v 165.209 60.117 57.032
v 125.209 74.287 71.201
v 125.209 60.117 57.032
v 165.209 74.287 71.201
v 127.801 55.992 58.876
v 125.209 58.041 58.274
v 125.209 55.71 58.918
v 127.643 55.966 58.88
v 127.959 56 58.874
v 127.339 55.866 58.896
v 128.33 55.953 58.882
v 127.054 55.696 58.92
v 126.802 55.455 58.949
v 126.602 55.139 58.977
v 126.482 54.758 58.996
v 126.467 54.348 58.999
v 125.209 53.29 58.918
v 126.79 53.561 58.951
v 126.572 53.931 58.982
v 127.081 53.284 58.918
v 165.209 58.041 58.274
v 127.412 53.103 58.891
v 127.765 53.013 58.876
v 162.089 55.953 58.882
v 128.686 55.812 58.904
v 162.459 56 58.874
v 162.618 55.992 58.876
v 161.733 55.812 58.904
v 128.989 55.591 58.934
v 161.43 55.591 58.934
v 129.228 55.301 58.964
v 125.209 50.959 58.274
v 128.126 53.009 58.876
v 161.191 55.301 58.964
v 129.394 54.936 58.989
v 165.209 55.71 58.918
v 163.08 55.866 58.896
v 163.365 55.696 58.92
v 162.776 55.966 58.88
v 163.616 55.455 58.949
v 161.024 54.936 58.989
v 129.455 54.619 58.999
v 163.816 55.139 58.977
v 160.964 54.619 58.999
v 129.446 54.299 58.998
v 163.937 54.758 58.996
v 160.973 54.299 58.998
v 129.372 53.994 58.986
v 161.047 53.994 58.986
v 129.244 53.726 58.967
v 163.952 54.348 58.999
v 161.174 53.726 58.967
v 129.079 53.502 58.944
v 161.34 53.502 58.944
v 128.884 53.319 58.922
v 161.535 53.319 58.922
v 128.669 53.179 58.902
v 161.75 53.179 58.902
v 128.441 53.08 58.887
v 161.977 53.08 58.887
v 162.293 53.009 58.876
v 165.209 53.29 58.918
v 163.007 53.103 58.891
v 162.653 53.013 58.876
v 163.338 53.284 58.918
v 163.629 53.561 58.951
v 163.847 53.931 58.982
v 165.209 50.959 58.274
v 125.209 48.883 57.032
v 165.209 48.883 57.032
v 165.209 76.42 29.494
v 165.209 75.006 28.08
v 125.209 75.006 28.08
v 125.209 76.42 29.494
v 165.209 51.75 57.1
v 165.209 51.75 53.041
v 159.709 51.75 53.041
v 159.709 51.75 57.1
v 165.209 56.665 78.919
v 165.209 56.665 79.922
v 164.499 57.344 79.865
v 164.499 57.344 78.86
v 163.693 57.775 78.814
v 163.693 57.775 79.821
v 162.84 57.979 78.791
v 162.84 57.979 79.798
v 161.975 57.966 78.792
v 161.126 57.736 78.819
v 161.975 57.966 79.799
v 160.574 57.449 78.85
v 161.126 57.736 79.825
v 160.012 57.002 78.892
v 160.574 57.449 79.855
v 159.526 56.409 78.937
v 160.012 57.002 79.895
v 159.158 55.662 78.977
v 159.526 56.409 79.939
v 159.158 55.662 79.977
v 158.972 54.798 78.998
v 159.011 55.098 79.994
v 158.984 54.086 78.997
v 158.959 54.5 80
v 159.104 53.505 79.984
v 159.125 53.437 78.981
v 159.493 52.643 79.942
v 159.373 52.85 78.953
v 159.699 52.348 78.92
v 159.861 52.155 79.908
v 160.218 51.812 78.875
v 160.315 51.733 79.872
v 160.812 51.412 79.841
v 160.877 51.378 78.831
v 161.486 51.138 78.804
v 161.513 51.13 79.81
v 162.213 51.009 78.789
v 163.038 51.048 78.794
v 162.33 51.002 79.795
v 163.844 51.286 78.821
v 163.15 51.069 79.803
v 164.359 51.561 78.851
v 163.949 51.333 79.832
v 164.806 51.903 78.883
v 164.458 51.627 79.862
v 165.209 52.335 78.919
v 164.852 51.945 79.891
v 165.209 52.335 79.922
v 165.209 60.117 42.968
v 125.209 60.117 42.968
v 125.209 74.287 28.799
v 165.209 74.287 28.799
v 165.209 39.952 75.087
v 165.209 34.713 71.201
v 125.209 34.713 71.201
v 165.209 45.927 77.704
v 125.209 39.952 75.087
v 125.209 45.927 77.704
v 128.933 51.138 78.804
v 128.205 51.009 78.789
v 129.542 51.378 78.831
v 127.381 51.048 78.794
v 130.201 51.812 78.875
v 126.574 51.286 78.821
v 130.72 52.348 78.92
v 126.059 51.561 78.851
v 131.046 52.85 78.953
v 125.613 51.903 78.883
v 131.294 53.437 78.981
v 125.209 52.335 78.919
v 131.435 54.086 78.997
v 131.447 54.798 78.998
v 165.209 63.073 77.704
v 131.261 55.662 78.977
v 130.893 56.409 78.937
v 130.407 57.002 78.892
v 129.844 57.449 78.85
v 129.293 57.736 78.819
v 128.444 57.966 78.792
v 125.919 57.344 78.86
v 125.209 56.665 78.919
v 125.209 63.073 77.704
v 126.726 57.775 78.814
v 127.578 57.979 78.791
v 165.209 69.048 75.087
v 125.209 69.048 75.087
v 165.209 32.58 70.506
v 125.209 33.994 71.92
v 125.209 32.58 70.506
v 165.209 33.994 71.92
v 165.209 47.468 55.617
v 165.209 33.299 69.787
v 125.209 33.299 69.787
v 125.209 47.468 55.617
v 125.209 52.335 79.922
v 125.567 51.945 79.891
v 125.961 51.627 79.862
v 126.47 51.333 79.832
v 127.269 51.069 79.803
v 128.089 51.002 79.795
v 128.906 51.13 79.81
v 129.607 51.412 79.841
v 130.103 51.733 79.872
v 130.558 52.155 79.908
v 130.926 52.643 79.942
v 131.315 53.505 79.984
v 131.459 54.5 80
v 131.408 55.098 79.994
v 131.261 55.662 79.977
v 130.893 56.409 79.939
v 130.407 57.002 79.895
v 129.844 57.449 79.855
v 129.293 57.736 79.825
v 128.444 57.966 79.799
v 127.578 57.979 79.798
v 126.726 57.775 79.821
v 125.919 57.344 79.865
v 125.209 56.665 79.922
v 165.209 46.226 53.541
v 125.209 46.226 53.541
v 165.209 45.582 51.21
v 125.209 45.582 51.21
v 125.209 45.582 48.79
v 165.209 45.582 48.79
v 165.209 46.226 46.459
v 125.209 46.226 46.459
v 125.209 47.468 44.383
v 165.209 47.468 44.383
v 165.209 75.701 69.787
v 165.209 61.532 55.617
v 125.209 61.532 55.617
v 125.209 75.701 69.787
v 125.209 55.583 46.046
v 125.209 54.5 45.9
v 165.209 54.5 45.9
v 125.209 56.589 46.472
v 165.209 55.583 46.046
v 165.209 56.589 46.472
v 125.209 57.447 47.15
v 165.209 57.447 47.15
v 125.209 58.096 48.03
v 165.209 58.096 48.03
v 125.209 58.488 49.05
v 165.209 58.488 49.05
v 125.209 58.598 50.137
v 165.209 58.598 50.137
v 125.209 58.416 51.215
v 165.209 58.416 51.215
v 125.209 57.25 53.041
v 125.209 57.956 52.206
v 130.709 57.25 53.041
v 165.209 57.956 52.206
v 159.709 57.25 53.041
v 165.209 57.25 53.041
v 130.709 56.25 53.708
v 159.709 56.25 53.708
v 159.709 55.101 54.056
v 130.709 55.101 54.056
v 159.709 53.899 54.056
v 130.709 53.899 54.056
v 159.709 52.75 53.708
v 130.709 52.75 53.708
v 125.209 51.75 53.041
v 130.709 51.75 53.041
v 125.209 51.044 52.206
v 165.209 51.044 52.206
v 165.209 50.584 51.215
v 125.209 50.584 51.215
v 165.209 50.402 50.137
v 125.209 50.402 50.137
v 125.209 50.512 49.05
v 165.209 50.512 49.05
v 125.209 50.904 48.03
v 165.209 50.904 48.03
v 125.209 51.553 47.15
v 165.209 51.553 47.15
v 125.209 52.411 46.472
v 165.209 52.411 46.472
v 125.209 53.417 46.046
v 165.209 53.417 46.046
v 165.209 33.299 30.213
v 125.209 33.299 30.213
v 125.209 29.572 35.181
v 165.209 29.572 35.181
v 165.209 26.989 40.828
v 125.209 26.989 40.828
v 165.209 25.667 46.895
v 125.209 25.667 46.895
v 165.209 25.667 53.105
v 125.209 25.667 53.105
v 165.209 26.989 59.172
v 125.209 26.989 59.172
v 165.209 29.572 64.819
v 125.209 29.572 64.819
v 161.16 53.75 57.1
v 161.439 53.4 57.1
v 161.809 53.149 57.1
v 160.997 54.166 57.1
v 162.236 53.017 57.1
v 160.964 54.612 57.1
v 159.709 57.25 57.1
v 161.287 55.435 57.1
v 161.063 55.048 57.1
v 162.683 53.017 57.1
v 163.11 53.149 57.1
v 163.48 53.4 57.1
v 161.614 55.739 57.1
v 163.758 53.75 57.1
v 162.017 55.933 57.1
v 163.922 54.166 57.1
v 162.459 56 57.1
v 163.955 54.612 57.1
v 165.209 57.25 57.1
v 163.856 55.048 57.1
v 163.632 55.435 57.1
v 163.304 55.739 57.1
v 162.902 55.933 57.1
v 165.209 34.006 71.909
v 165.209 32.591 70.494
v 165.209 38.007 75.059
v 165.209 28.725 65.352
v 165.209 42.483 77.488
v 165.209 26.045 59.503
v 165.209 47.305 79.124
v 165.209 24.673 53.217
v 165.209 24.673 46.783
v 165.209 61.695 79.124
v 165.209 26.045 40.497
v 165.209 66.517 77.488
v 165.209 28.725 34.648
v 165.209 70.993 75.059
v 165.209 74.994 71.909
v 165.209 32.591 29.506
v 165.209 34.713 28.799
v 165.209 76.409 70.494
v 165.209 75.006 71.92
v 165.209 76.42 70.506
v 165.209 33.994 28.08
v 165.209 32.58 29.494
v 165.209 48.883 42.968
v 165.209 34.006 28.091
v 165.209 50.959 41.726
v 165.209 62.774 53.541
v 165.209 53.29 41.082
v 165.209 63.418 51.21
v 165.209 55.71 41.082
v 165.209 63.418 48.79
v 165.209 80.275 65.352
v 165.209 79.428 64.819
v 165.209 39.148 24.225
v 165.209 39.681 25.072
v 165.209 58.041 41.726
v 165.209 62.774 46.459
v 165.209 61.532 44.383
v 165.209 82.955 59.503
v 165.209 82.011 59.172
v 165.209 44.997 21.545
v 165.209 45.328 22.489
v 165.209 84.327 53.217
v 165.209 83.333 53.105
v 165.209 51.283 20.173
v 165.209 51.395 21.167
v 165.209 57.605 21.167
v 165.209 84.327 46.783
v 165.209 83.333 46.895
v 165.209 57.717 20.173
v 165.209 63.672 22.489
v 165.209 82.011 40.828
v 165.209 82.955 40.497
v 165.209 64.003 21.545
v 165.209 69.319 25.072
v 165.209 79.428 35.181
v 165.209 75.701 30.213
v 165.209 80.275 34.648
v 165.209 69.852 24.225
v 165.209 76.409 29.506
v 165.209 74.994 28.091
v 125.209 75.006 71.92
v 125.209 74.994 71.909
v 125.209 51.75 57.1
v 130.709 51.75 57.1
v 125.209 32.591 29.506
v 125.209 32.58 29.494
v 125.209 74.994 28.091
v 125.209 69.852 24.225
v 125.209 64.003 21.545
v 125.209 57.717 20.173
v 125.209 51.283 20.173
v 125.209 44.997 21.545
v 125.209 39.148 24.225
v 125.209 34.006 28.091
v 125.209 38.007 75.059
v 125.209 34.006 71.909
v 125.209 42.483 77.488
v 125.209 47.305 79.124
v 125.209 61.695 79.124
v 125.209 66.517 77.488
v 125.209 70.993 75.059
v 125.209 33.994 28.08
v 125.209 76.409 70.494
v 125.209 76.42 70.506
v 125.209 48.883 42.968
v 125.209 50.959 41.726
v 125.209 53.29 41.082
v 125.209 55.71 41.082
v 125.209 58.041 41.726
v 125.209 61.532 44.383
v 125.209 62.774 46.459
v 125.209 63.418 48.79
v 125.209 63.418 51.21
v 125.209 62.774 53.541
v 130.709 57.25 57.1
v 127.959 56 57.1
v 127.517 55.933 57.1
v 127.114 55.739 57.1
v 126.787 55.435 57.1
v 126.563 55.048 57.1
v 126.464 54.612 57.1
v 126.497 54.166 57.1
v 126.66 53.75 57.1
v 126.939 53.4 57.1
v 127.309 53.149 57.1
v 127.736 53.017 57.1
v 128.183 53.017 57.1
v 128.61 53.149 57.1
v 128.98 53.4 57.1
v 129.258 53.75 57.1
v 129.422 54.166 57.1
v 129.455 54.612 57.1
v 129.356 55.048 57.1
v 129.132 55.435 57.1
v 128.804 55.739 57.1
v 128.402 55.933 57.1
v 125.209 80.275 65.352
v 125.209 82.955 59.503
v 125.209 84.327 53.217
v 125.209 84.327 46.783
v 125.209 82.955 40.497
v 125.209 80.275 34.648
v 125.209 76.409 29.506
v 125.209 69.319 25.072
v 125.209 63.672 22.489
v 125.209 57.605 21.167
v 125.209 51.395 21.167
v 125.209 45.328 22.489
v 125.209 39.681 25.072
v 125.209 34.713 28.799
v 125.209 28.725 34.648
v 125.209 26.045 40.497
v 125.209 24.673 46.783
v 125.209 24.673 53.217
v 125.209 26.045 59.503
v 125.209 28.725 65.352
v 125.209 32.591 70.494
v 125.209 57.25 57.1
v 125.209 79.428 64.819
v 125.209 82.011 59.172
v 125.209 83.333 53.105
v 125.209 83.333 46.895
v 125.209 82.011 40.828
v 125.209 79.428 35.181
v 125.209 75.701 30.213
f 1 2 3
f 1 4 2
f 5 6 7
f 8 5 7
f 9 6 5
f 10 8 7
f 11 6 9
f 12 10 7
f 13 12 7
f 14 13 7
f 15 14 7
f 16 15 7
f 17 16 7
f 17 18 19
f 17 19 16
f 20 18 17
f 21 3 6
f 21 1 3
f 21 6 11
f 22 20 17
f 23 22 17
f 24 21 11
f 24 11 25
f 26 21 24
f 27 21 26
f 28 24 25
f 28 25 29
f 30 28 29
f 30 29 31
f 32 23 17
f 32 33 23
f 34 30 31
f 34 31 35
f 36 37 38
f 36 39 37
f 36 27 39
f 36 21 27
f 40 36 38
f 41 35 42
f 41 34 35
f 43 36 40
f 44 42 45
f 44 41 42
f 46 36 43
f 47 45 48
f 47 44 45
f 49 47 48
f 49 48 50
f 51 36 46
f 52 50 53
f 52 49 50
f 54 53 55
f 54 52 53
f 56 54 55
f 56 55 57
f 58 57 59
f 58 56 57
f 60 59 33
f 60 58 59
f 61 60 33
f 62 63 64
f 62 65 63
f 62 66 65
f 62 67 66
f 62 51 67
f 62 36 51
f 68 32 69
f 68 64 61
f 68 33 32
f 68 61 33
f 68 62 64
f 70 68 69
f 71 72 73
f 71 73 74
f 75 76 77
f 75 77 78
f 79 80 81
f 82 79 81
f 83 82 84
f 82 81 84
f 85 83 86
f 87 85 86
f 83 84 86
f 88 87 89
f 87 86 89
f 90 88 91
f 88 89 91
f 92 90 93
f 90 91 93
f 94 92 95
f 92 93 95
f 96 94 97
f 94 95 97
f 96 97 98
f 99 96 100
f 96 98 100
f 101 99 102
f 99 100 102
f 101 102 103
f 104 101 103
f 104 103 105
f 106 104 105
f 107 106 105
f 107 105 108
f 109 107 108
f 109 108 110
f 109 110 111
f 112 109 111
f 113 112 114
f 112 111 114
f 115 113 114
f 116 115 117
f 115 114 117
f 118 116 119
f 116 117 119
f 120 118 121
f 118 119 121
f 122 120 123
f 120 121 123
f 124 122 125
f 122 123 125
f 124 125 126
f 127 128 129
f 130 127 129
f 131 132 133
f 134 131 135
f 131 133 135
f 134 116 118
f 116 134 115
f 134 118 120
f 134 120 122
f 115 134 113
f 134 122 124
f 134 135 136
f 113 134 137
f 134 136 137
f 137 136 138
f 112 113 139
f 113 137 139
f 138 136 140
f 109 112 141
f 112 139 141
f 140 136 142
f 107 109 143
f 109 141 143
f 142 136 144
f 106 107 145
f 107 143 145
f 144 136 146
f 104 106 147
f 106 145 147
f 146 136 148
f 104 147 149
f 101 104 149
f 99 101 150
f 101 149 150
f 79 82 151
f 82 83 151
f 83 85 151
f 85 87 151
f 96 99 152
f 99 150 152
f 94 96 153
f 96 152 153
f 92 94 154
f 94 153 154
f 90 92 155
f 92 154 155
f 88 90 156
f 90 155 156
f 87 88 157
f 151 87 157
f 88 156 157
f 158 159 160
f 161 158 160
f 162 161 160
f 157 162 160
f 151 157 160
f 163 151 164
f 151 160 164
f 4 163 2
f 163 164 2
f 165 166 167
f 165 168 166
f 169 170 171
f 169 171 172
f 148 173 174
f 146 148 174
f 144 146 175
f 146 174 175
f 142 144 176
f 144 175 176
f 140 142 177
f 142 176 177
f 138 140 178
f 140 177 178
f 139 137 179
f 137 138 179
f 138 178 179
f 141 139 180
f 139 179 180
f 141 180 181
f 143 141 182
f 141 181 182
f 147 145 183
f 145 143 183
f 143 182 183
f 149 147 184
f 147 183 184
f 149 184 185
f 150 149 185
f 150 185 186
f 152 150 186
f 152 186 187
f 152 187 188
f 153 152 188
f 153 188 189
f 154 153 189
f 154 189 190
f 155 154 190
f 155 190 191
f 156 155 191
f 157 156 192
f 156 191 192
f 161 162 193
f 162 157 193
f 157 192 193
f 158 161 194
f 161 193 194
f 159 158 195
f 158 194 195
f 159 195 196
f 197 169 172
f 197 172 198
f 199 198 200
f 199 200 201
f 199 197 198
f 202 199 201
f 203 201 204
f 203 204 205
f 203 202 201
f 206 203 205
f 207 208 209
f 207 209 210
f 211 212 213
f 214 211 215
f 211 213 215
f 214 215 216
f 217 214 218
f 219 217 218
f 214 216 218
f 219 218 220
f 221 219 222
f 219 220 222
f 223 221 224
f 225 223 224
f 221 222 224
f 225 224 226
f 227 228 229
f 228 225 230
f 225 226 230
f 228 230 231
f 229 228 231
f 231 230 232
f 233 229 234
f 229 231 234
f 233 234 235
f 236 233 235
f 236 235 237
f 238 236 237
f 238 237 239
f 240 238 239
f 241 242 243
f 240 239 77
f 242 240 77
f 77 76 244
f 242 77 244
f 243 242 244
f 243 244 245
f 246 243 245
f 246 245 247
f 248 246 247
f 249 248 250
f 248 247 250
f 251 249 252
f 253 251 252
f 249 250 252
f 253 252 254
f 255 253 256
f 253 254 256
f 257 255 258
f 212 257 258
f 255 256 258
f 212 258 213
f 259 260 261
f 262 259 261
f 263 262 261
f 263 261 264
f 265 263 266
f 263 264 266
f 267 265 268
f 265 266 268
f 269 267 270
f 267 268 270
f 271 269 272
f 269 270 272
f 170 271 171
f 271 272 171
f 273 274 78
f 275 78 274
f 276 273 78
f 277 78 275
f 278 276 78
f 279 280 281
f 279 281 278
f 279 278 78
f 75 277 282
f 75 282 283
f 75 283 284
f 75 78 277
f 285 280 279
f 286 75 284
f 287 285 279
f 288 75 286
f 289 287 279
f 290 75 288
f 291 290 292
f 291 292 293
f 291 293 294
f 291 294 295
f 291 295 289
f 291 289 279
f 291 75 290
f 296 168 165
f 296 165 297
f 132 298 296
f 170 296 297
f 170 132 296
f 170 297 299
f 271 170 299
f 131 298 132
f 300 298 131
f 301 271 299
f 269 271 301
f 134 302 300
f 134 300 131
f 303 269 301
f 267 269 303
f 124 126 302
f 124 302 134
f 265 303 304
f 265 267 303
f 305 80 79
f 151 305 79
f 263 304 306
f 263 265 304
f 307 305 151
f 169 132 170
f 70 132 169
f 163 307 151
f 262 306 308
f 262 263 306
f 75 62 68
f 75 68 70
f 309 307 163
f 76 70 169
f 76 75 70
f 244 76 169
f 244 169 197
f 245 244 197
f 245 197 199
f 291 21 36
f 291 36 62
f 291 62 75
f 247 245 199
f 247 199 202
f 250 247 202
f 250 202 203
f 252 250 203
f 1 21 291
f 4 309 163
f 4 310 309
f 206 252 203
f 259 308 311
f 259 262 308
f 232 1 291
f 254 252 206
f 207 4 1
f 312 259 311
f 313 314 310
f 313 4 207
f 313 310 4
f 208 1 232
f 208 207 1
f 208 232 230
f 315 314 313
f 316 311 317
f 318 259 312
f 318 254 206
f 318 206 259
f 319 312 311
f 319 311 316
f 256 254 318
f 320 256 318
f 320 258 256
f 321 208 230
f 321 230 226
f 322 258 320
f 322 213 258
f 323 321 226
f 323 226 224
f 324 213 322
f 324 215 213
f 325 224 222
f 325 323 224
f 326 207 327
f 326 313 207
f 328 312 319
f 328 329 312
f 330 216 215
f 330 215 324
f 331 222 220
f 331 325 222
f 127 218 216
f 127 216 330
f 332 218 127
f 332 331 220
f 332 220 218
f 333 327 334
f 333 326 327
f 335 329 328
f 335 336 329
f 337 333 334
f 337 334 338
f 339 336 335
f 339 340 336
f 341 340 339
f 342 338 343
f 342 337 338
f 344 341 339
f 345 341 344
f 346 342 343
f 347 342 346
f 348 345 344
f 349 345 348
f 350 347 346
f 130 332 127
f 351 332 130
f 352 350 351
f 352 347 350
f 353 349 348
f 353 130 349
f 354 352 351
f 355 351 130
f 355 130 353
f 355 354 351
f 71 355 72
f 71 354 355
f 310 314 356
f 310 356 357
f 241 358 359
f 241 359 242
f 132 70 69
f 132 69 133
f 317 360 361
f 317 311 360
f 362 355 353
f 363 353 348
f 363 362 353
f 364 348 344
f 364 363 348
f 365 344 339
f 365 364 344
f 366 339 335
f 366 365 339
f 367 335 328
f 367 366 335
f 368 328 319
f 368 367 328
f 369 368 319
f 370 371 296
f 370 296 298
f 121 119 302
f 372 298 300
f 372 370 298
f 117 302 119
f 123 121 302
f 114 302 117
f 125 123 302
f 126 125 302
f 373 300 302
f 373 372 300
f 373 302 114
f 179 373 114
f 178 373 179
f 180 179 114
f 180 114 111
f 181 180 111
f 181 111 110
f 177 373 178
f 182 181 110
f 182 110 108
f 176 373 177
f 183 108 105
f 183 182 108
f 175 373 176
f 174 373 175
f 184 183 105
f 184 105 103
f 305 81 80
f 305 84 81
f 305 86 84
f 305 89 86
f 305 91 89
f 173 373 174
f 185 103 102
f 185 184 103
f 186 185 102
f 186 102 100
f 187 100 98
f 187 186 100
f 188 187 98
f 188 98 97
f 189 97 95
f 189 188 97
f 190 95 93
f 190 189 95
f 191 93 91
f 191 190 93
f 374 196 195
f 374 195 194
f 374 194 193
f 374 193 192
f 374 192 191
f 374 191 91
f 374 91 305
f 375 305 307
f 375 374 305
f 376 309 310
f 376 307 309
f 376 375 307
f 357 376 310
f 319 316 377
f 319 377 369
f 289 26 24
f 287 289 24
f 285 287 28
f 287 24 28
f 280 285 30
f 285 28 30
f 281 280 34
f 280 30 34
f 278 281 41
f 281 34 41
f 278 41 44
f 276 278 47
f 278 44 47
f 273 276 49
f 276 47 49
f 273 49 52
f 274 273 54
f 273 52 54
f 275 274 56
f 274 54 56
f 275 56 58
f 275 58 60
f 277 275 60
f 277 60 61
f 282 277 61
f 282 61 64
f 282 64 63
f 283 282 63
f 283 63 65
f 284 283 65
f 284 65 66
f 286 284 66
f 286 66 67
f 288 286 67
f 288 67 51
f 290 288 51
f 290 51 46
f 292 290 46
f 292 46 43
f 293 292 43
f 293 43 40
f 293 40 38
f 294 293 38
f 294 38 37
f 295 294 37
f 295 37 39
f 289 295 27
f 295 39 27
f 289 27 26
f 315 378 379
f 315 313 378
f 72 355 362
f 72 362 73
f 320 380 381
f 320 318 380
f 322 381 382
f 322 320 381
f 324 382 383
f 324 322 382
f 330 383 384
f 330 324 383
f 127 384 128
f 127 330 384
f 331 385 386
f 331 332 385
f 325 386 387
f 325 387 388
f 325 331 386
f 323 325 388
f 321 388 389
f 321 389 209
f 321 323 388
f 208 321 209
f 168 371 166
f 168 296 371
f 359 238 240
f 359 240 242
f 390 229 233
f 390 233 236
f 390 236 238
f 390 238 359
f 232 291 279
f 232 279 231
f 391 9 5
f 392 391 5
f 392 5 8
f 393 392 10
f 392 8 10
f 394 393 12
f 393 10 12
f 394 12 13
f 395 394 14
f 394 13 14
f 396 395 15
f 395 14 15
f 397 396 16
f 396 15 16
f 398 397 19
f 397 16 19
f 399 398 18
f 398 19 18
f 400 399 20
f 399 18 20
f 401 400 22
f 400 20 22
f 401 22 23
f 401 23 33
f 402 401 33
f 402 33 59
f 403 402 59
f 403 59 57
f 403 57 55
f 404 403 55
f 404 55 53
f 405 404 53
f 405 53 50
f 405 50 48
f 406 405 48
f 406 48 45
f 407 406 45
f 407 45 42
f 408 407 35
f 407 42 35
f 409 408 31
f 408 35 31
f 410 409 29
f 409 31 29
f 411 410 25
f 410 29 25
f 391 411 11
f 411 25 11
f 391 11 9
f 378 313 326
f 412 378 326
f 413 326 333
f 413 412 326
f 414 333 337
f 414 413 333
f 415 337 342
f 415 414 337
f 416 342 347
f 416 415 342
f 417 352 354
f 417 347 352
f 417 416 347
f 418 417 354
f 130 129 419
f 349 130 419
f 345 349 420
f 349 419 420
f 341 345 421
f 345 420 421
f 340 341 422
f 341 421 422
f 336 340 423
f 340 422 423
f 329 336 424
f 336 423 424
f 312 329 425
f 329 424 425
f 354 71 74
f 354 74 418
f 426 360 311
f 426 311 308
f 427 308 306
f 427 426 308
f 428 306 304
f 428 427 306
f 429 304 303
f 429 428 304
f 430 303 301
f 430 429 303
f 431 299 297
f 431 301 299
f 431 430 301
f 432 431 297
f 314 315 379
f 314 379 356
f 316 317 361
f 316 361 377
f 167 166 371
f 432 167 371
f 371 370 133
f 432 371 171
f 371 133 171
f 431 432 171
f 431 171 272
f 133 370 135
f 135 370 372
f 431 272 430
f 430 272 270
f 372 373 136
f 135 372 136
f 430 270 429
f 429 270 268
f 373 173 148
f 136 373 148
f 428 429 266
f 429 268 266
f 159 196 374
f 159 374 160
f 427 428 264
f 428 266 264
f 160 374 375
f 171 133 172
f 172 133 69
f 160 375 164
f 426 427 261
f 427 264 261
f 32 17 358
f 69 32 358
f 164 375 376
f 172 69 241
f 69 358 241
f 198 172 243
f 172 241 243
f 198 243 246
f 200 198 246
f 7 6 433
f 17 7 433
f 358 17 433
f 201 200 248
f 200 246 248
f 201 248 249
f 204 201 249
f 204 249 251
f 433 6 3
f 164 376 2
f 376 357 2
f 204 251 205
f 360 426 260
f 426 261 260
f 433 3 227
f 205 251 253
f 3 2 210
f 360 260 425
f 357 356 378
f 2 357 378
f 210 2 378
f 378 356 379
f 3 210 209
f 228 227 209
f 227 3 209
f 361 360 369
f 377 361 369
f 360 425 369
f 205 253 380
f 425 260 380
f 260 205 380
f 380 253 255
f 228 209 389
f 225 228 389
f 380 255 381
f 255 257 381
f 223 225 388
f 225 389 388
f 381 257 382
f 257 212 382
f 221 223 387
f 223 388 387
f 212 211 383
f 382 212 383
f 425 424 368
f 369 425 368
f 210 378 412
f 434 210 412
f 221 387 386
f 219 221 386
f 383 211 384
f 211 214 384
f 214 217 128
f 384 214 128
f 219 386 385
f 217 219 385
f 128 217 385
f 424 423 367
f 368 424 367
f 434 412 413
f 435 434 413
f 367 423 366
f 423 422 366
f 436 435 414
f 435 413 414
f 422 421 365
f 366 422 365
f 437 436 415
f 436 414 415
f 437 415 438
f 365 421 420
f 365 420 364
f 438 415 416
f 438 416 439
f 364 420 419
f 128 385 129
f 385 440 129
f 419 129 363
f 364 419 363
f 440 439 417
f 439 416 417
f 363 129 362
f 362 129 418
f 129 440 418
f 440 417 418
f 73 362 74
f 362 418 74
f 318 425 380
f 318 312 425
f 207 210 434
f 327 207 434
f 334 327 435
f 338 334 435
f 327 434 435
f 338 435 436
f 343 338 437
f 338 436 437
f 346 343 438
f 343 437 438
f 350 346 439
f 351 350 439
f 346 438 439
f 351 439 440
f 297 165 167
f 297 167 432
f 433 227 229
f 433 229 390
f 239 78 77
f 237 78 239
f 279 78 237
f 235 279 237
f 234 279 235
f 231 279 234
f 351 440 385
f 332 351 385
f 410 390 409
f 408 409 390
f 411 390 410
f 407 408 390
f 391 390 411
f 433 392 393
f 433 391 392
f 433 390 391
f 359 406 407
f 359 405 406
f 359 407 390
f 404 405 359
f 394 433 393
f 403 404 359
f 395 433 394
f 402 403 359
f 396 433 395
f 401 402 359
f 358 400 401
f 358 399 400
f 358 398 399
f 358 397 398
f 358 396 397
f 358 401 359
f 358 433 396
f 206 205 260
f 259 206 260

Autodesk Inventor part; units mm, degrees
ref_plane "Plano de trabajo3" through (185, 53, 51.5) normal (1, 0, 0) x (0, 0, -1)
ref_plane "Plano de trabajo4" through (125.2094, 54.5, 50) normal (1, 0, 0) x (0, 0, -1)
sketch "Boceto3" plane through (125.2094, 54.5, 50) normal (1, 0, 0) x (0, 0, -1)
  circle A0 centre (0, 0) radius 30
  circle A1 centre (0, 0) radius 5
  point P0 (50, -54.5)
  dimension "d5" = 60
  dimension "d9" = 10
extrude "Extrusión1" add sketch "Boceto3" along normal blind 40 contours A0 | A1
shell "Vaciado1" thickness 1 removed faces 2 at (125.2094, 56.8932, 44.7392) at (165.2094, 56.8932, 44.7392)
sketch "Boceto4" plane through (165.2094, 54.5, 50) normal (1, 0, 0) x (0, 0, -1)
  circle A0 centre (0, 0) radius 9
  circle A1 centre (0, 0) radius 4.1
  point P0 (50, -54.5)
  dimension "d10" = 18
  dimension "d11" = 8.2
extrude "Extrusión2" add sketch "Boceto4" against normal blind 40
sketch "Boceto5" plane through (165.2094, 54.5, 50) normal (1, 0, 0) x (0, 0, -1)
  line L0 (0, 0) -> (-4.1, 0)
  circle A0 centre (0, 0) radius 4.1 projected
  line L1 (-4.1, 0) -> (-7.1, 0)
  line L2 (-1.1, -2.75) -> (-7.1, -2.75)
  line L3 (-7.1, -2.75) -> (-7.1, 2.75)
  line L4 (-7.1, 2.75) -> (-1.1, 2.75)
  line L5 (-1.1, 2.75) -> (-1.1, -2.75)
  line L6 (-1.1, -2.75) -> (-7.1, 2.75) construction
  line L7 (-7.1, -2.75) -> (-1.1, 2.75) construction
  point P0 (50, -54.5)
  point P1 (-3.041, -2.75)
  point P2 (-3.041, 2.75)
  dimension "d14" = 3
  dimension "d15" = 5.5
extrude "Extrusión3" cut sketch "Boceto5" against normal blind 5.5 contours L1 L3 L4 A0 | A0 L2 L3 L1
sketch "Boceto6" plane through (165.2094, 51.75, 57.1) normal (0, 0, -1) x (-1, 0, 0)
  line L0 (0, 0) -> (0, 5.5) projected
  line L1 (0, 0) -> (5.5, 0) projected
  line L2 (5.5, 0) -> (5.5, 5.5) projected
  line L3 (0, 5.5) -> (5.5, 5.5) projected
  line L4 (5.5, 0) -> (5.5, 5.5) projected
  line L5 (5.5, 5.5) -> (0, 0)
  circle A0 centre (2.75, 2.75) radius 1.5
  point P0 (165.2094, -51.75)
  dimension "d18" = 3
hole "Agujero1" at (162.4594, 54.5, 57.1) direction (0, 0, 1) diameter 3 depth 3.7 tip angle 118
ref_plane "Plano de trabajo5" through (145.2094, 54.5, 50) normal (1, 0, 0) x (0, 0, -1)
ref_plane "Plano de trabajo6" through (0, 0, 80) normal (0, 0, 1) x (1, 0, 0)
sketch "Boceto7" plane through (0, 0, 80) normal (0, 0, 1) x (1, 0, 0)
  line L0 (162.4594, 56) -> (162.4594, 53)
  circle A0 centre (162.4594, 54.5) radius 3.5
  point P0 (0, 0)
  dimension "d27" = 7
extrude "Extrusión4" cut sketch "Boceto7" against normal blind 5.5
mirror "Simetría2" about plane through (145.2094, 54.5, 50) normal (1, 0, 0) of "Extrusión4", "Agujero1", "Extrusión3"
sketch "Boceto10" plane through (165.2094, 54.5, 50) normal (1, 0, 0) x (0, 0, -1)
  line L0 (20.5061, -21.9203) -> (21.9203, -20.5061)
  line L1 (21.9203, -20.5061) -> (-20.5061, 21.9203)
  line L2 (-20.5061, 21.9203) -> (-21.9203, 20.5061)
  line L3 (-21.9203, 20.5061) -> (20.5061, -21.9203)
  line L4 (20.5061, -21.9203) -> (-20.5061, 21.9203) construction
  line L5 (21.9203, -20.5061) -> (-21.9203, 20.5061) construction
  line L6 (21.9203, 20.5061) -> (20.5061, 21.9203)
  line L7 (20.5061, 21.9203) -> (-21.9203, -20.5061)
  line L8 (-21.9203, -20.5061) -> (-20.5061, -21.9203)
  line L9 (-20.5061, -21.9203) -> (21.9203, 20.5061)
  line L10 (21.9203, 20.5061) -> (-21.9203, -20.5061) construction
  line L11 (20.5061, 21.9203) -> (-20.5061, -21.9203) construction
  line L12 (-3.041, -2.75) -> (-7.1, -2.75) projected
  line L13 (-7.1, -2.75) -> (-7.1, 2.75) projected
  line L14 (-7.1, 2.75) -> (-3.041, 2.75) projected
  arc A0 (-3.041, -2.75) -> (-3.041, 2.75) centre (0, 0) ccw projected
  circle A1 centre (0, 0) radius 9 projected
  circle A2 centre (0, 0) radius 9
  point P0 (50, -54.5)
  point P1 (0, 0)
  point P2 (2.1045, 3.5187)
  point P3 (3.5187, 2.1045)
  point P4 (-2.1045, -3.5187)
  point P5 (-4.1642, -2.75)
  point P6 (-4.1642, 2.75)
  point P7 (-2.1045, 3.5187)
  point P8 (3.5187, -2.1045)
  point P9 (2.1045, -3.5187)
  dimension "d30" = 2
  dimension "d31" = 60
  dimension "d32" = 2
  dimension "d33" = 60
extrude "Extrusión5" add sketch "Boceto10" against normal blind 40 contours L3 A1 L1 L0 | L3 A0 L1 A1 | A1 L7 L12 A0 L9 | L9 L8 L7 A1 | A0 L7 A1 L9 | A1 L7 L6 L9 | A1 L1 A0 L14 L3 | L3 L2 L1 A1
properties part number "Rampa"
